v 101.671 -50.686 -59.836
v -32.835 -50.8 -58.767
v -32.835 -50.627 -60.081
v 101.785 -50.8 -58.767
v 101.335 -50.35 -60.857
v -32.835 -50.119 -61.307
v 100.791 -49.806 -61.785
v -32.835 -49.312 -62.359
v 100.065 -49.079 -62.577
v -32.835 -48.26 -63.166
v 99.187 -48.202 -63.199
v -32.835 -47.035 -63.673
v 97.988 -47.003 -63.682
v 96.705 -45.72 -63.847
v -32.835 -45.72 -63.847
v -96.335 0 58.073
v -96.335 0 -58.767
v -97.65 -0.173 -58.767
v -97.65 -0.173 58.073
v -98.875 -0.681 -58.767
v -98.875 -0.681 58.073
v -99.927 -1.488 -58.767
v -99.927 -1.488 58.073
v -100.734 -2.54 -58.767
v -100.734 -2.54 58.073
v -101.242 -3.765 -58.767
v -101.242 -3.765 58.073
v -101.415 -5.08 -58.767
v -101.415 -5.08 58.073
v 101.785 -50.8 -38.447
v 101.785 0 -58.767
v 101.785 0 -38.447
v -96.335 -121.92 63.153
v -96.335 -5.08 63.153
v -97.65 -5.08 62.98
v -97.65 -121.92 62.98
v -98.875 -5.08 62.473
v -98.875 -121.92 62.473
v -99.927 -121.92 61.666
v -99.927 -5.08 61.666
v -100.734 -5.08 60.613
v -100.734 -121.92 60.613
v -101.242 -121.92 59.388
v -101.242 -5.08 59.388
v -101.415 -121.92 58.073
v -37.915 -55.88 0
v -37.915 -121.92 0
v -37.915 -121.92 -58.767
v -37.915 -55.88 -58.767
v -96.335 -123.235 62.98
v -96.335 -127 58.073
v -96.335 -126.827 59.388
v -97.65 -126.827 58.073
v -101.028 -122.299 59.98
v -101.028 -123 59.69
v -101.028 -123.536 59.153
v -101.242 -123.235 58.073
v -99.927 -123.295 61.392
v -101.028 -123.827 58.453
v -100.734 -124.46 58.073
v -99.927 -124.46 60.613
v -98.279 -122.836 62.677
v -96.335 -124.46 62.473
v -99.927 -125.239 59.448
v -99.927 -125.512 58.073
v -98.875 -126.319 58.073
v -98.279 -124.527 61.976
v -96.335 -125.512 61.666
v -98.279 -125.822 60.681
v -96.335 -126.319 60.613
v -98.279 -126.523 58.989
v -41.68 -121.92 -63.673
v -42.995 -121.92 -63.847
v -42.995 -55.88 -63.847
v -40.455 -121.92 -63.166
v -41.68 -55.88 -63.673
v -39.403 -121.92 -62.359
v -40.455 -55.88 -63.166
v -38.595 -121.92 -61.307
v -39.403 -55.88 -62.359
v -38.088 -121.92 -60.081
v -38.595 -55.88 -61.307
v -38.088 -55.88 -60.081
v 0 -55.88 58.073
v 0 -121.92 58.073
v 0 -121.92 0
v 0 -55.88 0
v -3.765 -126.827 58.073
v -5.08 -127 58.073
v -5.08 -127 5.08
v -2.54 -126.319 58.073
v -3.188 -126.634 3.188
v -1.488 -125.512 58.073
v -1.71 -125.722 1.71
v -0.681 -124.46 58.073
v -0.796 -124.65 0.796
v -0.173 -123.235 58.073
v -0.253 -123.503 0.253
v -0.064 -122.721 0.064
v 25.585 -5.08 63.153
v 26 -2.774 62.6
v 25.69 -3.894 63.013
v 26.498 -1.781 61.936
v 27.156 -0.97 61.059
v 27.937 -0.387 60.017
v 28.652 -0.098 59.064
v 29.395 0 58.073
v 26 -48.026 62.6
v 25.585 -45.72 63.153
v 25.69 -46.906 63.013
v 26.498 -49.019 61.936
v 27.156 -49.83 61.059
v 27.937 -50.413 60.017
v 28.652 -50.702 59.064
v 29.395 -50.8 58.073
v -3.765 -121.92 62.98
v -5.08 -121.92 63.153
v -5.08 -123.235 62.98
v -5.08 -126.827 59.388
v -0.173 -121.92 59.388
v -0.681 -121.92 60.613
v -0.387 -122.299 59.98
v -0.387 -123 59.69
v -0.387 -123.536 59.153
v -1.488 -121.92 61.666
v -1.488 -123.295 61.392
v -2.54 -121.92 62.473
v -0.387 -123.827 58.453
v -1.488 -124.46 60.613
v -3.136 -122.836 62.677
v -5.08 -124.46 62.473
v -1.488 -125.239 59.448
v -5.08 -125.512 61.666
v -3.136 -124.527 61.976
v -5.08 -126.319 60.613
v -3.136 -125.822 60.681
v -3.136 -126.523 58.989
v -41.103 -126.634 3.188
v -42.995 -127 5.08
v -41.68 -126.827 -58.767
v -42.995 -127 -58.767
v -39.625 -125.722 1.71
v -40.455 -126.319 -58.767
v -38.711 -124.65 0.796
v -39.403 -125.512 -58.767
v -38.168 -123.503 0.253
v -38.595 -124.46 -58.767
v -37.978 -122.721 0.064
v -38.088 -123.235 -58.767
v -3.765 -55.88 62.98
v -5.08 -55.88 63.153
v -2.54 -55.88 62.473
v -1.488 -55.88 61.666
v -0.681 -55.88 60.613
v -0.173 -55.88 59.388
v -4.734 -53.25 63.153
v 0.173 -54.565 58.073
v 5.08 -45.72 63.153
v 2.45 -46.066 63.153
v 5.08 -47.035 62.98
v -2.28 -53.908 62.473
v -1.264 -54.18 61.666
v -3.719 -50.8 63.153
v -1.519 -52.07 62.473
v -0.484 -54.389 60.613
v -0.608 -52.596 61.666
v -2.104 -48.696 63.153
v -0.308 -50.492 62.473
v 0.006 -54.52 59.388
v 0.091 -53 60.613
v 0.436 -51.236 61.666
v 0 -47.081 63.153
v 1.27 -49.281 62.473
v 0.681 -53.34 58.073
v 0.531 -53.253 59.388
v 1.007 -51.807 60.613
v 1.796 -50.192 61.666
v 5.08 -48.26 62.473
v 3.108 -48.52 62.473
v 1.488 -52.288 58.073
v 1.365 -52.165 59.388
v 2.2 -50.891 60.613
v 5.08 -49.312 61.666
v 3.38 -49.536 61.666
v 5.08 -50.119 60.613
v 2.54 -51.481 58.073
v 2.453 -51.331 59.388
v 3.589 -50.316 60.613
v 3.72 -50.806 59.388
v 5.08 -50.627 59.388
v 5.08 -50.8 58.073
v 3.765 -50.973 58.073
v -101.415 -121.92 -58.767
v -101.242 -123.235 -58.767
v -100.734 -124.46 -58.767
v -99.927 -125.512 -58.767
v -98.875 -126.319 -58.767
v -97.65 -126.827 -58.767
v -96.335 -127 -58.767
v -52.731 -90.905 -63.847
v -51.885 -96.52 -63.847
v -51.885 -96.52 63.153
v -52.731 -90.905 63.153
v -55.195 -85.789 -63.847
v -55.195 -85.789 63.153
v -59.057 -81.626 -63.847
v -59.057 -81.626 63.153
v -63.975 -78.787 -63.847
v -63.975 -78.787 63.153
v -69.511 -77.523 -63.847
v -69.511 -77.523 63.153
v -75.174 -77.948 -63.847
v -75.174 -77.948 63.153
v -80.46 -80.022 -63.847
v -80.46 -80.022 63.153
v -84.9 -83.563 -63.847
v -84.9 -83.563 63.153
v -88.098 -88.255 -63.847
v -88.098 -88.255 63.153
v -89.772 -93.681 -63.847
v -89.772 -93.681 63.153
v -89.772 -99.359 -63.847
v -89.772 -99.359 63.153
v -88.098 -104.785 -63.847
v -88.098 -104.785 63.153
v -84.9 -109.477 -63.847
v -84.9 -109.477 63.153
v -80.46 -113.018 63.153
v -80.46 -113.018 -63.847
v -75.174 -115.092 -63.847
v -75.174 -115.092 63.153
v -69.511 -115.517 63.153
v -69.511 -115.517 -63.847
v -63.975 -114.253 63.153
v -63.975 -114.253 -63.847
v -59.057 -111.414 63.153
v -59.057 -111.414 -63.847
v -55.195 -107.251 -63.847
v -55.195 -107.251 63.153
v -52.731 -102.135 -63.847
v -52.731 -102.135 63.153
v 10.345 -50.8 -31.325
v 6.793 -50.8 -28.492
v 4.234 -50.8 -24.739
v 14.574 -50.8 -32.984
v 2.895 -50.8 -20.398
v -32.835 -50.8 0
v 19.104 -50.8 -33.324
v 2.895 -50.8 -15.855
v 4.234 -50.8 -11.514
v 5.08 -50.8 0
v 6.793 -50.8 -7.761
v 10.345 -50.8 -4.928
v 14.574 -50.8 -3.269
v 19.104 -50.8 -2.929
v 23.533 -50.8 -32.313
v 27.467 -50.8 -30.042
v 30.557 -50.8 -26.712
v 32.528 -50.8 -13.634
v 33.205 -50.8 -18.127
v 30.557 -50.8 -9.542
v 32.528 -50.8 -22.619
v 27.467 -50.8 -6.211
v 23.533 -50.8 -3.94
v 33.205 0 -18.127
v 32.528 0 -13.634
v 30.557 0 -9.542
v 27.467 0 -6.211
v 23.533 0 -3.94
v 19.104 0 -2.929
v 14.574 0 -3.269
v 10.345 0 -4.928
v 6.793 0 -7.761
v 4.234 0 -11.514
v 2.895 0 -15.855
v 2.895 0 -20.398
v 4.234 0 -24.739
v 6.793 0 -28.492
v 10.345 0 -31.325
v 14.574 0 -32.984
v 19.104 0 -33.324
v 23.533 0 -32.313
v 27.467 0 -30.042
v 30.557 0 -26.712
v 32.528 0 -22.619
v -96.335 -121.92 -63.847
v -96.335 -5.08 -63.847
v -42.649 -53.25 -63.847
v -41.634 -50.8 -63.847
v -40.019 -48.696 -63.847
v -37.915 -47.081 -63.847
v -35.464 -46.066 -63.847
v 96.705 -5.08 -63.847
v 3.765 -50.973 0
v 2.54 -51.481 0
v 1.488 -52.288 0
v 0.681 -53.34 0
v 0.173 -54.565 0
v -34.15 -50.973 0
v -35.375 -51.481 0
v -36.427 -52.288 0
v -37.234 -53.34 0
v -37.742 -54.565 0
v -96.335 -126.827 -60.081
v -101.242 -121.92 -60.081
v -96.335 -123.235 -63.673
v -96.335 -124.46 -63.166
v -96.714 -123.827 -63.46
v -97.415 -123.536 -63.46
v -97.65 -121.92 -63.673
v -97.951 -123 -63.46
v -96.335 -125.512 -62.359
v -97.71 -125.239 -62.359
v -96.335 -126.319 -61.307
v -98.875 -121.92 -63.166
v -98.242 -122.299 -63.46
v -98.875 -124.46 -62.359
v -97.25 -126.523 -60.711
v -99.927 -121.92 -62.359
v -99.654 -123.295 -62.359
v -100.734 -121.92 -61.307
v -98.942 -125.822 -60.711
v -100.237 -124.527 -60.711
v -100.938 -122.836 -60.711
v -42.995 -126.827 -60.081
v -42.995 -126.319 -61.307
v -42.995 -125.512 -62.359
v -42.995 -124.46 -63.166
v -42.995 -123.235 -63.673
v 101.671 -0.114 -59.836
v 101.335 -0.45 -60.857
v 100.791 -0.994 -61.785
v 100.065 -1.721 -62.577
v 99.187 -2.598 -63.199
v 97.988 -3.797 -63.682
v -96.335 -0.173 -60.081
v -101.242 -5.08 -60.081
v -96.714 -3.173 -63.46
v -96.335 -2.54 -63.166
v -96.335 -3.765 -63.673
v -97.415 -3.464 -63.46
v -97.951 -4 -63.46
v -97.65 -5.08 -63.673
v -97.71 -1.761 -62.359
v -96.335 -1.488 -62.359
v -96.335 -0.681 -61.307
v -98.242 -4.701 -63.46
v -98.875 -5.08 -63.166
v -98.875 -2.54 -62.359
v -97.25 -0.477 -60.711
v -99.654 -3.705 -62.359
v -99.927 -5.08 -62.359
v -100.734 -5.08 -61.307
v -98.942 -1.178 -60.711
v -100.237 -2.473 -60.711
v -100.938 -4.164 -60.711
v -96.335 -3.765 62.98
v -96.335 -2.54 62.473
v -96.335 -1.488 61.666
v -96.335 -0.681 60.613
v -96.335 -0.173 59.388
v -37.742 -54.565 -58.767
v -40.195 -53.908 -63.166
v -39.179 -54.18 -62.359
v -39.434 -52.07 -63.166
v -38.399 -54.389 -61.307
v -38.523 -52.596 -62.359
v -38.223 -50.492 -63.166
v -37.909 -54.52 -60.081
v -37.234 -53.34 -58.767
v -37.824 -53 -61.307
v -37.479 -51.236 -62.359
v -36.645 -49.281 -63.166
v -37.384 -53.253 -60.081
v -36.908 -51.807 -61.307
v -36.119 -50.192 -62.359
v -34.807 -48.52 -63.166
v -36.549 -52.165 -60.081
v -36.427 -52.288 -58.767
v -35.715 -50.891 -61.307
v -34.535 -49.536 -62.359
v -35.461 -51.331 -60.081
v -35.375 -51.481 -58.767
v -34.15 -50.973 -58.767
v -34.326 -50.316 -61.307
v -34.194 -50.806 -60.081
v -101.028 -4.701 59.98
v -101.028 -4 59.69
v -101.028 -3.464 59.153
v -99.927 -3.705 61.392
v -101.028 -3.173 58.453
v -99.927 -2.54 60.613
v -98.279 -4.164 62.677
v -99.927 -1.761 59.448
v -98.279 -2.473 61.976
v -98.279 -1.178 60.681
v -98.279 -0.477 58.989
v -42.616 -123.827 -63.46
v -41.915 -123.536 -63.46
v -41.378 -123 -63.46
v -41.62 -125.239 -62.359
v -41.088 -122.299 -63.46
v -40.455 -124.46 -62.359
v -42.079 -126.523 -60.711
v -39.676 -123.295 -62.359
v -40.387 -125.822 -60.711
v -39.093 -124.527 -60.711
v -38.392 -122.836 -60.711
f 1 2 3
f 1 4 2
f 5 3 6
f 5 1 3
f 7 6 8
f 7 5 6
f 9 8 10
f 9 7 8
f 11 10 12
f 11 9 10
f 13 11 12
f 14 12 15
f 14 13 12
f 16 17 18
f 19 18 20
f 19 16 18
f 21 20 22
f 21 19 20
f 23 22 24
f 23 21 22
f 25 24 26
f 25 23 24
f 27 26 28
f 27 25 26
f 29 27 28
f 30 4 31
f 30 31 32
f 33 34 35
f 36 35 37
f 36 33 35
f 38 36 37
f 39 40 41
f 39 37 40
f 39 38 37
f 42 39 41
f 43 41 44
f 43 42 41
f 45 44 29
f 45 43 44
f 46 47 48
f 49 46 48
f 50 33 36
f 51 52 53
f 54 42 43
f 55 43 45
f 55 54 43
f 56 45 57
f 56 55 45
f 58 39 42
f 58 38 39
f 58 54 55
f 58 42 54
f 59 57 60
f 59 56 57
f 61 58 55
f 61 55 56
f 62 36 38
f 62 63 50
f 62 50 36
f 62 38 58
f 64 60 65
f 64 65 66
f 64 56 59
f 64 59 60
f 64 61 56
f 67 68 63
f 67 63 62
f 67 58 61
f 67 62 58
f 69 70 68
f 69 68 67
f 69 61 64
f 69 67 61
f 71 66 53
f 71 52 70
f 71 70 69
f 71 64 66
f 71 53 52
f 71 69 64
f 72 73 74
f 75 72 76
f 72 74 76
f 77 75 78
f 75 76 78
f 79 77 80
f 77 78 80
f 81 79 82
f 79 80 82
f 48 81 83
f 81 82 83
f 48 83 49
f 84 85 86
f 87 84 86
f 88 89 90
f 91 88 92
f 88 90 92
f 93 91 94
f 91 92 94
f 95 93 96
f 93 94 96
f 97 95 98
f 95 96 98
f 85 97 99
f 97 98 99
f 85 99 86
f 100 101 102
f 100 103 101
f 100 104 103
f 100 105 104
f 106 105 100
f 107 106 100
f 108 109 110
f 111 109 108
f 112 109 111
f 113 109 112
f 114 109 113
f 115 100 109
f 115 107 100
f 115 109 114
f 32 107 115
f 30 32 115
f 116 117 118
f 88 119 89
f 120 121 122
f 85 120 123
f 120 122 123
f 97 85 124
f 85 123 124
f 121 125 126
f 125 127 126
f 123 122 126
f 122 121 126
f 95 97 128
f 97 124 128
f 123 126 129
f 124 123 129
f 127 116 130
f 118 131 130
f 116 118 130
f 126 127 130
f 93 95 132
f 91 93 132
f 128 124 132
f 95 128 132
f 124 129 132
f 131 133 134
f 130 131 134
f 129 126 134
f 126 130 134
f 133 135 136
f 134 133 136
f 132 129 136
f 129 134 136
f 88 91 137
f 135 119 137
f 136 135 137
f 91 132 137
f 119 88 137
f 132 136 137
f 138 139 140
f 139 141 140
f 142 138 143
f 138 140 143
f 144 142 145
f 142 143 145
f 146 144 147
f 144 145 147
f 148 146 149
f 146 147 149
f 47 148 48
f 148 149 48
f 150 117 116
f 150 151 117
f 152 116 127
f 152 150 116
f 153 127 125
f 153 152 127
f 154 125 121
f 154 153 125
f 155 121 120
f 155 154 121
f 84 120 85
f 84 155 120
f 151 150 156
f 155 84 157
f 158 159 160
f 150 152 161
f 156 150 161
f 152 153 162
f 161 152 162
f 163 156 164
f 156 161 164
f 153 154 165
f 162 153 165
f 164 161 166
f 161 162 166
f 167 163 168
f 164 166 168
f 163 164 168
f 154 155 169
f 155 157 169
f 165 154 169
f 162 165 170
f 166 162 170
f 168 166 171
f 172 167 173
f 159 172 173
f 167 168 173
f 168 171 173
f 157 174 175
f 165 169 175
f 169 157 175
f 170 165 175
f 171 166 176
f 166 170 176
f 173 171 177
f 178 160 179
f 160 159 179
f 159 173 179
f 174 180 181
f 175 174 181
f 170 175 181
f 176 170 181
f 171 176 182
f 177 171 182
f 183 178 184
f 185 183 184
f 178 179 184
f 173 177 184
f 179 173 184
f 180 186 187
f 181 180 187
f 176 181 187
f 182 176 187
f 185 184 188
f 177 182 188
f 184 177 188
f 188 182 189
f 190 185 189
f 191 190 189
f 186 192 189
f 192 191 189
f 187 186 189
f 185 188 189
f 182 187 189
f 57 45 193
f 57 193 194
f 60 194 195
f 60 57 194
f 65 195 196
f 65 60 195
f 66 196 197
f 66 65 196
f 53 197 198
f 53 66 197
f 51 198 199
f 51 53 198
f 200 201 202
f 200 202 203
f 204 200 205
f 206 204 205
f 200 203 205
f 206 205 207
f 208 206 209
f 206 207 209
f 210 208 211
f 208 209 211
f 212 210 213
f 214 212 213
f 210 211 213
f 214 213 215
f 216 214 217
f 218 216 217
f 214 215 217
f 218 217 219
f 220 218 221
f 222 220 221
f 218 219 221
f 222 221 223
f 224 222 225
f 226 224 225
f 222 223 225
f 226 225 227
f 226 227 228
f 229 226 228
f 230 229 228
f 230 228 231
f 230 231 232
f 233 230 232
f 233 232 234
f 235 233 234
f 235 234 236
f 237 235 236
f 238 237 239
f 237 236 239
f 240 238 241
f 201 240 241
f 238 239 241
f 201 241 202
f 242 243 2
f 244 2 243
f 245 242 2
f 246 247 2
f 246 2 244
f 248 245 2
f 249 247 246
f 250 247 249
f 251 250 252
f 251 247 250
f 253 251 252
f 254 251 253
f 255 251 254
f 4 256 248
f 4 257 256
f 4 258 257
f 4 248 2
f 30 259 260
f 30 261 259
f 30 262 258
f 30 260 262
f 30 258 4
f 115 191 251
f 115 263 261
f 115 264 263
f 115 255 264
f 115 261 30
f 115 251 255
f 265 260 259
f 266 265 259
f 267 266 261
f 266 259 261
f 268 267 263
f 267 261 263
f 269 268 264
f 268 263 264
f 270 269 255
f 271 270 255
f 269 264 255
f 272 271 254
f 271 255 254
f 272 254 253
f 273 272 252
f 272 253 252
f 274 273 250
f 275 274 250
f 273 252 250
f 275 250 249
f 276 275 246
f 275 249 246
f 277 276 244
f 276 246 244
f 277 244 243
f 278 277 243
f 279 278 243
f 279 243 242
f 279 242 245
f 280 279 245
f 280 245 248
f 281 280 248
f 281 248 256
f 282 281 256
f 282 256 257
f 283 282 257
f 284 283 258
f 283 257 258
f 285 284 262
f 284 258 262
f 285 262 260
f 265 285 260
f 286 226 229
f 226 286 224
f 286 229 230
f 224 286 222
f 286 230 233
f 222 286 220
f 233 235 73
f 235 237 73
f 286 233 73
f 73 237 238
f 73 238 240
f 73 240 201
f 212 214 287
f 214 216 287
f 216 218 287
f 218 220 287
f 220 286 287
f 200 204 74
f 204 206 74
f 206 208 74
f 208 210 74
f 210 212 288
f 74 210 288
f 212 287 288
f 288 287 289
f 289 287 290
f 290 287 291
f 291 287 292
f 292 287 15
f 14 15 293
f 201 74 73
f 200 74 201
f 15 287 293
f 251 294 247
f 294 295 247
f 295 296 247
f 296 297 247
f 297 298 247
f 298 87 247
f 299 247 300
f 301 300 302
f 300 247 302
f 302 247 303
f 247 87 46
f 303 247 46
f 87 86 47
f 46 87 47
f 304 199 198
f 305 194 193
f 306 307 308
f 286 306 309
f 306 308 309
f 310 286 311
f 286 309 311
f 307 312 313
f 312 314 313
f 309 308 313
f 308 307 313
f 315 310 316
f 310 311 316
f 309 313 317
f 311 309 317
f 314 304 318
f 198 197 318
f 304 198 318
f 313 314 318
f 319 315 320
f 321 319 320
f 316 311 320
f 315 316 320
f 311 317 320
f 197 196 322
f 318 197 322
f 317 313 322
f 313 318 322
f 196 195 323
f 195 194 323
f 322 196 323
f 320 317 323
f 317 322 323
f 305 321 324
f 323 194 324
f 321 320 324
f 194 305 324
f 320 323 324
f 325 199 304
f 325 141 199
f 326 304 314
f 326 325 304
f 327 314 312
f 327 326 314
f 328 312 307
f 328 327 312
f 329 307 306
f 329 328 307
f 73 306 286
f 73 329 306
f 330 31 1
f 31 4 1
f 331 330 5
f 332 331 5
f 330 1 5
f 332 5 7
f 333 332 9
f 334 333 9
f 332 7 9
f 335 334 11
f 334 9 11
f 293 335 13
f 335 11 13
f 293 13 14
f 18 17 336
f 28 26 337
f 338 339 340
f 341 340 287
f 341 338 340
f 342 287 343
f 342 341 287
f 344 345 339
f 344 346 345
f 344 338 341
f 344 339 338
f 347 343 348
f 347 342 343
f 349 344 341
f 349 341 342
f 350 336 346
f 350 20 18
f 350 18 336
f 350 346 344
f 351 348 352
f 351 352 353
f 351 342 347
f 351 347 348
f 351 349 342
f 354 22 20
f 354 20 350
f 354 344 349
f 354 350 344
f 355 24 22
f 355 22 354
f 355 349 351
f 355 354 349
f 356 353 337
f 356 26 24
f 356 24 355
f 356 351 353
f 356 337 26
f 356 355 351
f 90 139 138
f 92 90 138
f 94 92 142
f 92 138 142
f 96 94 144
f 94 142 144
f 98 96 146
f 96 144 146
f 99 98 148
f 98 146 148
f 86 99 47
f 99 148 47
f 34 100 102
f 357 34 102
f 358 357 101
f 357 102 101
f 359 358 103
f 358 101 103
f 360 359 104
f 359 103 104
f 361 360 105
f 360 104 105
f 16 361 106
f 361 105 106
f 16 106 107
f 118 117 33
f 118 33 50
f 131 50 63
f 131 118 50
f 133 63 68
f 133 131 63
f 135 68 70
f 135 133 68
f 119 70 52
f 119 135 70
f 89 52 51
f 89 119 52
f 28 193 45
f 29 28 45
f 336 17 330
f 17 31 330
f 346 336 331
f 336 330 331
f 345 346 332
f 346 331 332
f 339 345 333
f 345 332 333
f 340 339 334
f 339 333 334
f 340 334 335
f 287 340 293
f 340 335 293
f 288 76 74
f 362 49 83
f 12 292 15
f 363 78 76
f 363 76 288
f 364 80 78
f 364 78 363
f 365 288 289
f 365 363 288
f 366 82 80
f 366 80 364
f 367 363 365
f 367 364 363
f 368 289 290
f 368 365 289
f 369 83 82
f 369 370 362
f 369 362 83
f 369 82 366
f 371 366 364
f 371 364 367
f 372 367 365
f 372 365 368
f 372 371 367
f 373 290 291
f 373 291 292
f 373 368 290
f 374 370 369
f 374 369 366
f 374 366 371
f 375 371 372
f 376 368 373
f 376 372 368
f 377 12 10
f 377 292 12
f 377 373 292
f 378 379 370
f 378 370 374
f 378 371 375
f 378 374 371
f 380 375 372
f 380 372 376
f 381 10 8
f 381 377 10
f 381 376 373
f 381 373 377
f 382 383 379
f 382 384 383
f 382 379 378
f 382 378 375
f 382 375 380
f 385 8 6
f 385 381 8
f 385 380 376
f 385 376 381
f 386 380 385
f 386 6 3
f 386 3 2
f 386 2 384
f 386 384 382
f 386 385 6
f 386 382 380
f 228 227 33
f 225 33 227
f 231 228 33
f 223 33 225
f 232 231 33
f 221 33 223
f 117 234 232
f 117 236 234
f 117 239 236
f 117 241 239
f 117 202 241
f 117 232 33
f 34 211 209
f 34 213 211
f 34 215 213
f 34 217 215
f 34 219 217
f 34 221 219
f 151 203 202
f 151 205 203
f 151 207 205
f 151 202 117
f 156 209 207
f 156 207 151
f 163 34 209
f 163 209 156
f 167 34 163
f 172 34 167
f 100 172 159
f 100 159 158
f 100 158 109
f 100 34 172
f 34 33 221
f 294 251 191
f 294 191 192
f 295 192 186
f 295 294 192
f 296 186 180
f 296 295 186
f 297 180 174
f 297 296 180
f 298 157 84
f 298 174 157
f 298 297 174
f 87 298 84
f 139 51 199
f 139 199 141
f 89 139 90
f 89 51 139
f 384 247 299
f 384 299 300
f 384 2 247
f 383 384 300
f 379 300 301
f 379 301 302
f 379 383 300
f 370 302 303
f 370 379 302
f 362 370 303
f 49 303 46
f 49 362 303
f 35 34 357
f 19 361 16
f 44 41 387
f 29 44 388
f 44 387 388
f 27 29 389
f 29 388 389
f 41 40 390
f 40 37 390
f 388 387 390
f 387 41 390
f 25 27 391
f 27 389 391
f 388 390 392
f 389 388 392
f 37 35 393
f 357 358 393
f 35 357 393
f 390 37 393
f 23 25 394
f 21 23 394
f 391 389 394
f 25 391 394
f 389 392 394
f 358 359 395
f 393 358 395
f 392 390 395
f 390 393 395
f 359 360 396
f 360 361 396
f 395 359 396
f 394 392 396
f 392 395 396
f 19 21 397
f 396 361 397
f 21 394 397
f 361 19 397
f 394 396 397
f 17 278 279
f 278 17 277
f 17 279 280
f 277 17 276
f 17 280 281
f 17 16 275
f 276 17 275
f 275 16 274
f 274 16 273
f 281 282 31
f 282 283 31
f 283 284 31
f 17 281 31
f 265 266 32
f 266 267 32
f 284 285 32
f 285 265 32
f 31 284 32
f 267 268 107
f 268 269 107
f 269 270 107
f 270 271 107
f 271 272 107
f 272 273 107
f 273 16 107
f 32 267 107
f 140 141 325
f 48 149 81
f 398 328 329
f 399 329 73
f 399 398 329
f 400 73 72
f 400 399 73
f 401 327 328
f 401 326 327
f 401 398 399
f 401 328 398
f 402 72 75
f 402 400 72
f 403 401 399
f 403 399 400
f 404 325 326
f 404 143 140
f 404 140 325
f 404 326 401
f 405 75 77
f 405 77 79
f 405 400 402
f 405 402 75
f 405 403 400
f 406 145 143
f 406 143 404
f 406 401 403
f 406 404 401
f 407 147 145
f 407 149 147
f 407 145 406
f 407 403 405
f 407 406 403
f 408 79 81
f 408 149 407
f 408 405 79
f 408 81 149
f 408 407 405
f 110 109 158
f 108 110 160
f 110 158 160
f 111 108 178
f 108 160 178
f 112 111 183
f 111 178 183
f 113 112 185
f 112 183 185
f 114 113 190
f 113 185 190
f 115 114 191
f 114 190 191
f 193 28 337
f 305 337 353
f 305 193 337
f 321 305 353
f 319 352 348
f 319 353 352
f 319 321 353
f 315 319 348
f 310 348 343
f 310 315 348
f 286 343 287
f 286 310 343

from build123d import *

# Parameters (mm, degrees)
F0_W     = 203.2
F0_H     = 127
F1_DEPTH = 127
F3_DEPTH = 76.2
F4_SIZE2 = 101.6
F4_SIZE  = 76.2
F5_R     = 5.08
F6_R     = 15.24
F7_DEPTH = 50.8
F8_R     = 19.05
F9_DEPTH = 127


with BuildPart() as f1:
    # F0 (on Front) → F1 (new body)
    with BuildSketch(Plane.XZ):
        with Locations((0.1851254753, -0.3465637565)):
            Rectangle(F0_W, F0_H)
    extrude(amount=F1_DEPTH)

    # F2 (on face) → F3 (cut)
    with BuildSketch(Plane.XZ.offset(127)):
        Polygon((101.7851254753, 63.1534362435), (0, 63.1534362435), (0, 0), (-37.9148745247, 0), (-37.9148745247, -63.8465637565), (101.7851254753, -63.8465637565), align=None)
    extrude(amount=-F3_DEPTH, mode=Mode.SUBTRACT)

    # F4
    f4_edges = [f1.edges().sort_by_distance(p)[0] for p in [
        (101.785125, -25.4, 63.153436),
    ]]
    f4_side = f1.faces().sort_by_distance((-21.603245, -52.585928, 63.153436))[0]
    chamfer(f4_edges, length=F4_SIZE, length2=F4_SIZE2, reference=f4_side)

    # F5
    f5_edges = [f1.edges().sort_by_distance(p)[0] for p in [
        (-50.707437, -127, 63.153436),
        (0, -88.9, 63.153436),
        (0, -127, 31.576718),
        (-18.957437, -127, 0),
        (-37.914875, -127, -31.923282),
        (-37.914875, -50.8, -31.923282),
        (12.792563, -50.8, 63.153436),
        (0, -50.8, 31.576718),
        (-37.914875, 0, 63.153436),
        (-101.414875, -63.5, 63.153436),
        (-101.414875, -127, -0.346564),
        (-101.414875, 0, -0.346564),
        (-69.664875, -127, -63.846564),
        (-37.914875, -88.9, -63.846564),
        (101.785125, -25.4, -63.846564),
        (0.185125, 0, -63.846564),
        (-101.414875, -63.5, -63.846564),
        (31.935125, -50.8, -63.846564),
    ]]
    fillet(f5_edges, radius=F5_R)

    # F6 (on face) → F7 (cut, through all)
    with BuildSketch(Plane.XZ.offset(50.8)):
        with Locations((17.9651254753, -18.1265637565)):
            Circle(F6_R)
    extrude(amount=-F7_DEPTH, mode=Mode.SUBTRACT)

    # F8 (on face) → F9 (cut, through all)
    with BuildSketch(Plane.XY.offset(63.1534362435)):
        with Locations((-70.9348745247, -96.52)):
            Circle(F8_R)
    extrude(amount=-F9_DEPTH, mode=Mode.SUBTRACT)


solid = f1.part
